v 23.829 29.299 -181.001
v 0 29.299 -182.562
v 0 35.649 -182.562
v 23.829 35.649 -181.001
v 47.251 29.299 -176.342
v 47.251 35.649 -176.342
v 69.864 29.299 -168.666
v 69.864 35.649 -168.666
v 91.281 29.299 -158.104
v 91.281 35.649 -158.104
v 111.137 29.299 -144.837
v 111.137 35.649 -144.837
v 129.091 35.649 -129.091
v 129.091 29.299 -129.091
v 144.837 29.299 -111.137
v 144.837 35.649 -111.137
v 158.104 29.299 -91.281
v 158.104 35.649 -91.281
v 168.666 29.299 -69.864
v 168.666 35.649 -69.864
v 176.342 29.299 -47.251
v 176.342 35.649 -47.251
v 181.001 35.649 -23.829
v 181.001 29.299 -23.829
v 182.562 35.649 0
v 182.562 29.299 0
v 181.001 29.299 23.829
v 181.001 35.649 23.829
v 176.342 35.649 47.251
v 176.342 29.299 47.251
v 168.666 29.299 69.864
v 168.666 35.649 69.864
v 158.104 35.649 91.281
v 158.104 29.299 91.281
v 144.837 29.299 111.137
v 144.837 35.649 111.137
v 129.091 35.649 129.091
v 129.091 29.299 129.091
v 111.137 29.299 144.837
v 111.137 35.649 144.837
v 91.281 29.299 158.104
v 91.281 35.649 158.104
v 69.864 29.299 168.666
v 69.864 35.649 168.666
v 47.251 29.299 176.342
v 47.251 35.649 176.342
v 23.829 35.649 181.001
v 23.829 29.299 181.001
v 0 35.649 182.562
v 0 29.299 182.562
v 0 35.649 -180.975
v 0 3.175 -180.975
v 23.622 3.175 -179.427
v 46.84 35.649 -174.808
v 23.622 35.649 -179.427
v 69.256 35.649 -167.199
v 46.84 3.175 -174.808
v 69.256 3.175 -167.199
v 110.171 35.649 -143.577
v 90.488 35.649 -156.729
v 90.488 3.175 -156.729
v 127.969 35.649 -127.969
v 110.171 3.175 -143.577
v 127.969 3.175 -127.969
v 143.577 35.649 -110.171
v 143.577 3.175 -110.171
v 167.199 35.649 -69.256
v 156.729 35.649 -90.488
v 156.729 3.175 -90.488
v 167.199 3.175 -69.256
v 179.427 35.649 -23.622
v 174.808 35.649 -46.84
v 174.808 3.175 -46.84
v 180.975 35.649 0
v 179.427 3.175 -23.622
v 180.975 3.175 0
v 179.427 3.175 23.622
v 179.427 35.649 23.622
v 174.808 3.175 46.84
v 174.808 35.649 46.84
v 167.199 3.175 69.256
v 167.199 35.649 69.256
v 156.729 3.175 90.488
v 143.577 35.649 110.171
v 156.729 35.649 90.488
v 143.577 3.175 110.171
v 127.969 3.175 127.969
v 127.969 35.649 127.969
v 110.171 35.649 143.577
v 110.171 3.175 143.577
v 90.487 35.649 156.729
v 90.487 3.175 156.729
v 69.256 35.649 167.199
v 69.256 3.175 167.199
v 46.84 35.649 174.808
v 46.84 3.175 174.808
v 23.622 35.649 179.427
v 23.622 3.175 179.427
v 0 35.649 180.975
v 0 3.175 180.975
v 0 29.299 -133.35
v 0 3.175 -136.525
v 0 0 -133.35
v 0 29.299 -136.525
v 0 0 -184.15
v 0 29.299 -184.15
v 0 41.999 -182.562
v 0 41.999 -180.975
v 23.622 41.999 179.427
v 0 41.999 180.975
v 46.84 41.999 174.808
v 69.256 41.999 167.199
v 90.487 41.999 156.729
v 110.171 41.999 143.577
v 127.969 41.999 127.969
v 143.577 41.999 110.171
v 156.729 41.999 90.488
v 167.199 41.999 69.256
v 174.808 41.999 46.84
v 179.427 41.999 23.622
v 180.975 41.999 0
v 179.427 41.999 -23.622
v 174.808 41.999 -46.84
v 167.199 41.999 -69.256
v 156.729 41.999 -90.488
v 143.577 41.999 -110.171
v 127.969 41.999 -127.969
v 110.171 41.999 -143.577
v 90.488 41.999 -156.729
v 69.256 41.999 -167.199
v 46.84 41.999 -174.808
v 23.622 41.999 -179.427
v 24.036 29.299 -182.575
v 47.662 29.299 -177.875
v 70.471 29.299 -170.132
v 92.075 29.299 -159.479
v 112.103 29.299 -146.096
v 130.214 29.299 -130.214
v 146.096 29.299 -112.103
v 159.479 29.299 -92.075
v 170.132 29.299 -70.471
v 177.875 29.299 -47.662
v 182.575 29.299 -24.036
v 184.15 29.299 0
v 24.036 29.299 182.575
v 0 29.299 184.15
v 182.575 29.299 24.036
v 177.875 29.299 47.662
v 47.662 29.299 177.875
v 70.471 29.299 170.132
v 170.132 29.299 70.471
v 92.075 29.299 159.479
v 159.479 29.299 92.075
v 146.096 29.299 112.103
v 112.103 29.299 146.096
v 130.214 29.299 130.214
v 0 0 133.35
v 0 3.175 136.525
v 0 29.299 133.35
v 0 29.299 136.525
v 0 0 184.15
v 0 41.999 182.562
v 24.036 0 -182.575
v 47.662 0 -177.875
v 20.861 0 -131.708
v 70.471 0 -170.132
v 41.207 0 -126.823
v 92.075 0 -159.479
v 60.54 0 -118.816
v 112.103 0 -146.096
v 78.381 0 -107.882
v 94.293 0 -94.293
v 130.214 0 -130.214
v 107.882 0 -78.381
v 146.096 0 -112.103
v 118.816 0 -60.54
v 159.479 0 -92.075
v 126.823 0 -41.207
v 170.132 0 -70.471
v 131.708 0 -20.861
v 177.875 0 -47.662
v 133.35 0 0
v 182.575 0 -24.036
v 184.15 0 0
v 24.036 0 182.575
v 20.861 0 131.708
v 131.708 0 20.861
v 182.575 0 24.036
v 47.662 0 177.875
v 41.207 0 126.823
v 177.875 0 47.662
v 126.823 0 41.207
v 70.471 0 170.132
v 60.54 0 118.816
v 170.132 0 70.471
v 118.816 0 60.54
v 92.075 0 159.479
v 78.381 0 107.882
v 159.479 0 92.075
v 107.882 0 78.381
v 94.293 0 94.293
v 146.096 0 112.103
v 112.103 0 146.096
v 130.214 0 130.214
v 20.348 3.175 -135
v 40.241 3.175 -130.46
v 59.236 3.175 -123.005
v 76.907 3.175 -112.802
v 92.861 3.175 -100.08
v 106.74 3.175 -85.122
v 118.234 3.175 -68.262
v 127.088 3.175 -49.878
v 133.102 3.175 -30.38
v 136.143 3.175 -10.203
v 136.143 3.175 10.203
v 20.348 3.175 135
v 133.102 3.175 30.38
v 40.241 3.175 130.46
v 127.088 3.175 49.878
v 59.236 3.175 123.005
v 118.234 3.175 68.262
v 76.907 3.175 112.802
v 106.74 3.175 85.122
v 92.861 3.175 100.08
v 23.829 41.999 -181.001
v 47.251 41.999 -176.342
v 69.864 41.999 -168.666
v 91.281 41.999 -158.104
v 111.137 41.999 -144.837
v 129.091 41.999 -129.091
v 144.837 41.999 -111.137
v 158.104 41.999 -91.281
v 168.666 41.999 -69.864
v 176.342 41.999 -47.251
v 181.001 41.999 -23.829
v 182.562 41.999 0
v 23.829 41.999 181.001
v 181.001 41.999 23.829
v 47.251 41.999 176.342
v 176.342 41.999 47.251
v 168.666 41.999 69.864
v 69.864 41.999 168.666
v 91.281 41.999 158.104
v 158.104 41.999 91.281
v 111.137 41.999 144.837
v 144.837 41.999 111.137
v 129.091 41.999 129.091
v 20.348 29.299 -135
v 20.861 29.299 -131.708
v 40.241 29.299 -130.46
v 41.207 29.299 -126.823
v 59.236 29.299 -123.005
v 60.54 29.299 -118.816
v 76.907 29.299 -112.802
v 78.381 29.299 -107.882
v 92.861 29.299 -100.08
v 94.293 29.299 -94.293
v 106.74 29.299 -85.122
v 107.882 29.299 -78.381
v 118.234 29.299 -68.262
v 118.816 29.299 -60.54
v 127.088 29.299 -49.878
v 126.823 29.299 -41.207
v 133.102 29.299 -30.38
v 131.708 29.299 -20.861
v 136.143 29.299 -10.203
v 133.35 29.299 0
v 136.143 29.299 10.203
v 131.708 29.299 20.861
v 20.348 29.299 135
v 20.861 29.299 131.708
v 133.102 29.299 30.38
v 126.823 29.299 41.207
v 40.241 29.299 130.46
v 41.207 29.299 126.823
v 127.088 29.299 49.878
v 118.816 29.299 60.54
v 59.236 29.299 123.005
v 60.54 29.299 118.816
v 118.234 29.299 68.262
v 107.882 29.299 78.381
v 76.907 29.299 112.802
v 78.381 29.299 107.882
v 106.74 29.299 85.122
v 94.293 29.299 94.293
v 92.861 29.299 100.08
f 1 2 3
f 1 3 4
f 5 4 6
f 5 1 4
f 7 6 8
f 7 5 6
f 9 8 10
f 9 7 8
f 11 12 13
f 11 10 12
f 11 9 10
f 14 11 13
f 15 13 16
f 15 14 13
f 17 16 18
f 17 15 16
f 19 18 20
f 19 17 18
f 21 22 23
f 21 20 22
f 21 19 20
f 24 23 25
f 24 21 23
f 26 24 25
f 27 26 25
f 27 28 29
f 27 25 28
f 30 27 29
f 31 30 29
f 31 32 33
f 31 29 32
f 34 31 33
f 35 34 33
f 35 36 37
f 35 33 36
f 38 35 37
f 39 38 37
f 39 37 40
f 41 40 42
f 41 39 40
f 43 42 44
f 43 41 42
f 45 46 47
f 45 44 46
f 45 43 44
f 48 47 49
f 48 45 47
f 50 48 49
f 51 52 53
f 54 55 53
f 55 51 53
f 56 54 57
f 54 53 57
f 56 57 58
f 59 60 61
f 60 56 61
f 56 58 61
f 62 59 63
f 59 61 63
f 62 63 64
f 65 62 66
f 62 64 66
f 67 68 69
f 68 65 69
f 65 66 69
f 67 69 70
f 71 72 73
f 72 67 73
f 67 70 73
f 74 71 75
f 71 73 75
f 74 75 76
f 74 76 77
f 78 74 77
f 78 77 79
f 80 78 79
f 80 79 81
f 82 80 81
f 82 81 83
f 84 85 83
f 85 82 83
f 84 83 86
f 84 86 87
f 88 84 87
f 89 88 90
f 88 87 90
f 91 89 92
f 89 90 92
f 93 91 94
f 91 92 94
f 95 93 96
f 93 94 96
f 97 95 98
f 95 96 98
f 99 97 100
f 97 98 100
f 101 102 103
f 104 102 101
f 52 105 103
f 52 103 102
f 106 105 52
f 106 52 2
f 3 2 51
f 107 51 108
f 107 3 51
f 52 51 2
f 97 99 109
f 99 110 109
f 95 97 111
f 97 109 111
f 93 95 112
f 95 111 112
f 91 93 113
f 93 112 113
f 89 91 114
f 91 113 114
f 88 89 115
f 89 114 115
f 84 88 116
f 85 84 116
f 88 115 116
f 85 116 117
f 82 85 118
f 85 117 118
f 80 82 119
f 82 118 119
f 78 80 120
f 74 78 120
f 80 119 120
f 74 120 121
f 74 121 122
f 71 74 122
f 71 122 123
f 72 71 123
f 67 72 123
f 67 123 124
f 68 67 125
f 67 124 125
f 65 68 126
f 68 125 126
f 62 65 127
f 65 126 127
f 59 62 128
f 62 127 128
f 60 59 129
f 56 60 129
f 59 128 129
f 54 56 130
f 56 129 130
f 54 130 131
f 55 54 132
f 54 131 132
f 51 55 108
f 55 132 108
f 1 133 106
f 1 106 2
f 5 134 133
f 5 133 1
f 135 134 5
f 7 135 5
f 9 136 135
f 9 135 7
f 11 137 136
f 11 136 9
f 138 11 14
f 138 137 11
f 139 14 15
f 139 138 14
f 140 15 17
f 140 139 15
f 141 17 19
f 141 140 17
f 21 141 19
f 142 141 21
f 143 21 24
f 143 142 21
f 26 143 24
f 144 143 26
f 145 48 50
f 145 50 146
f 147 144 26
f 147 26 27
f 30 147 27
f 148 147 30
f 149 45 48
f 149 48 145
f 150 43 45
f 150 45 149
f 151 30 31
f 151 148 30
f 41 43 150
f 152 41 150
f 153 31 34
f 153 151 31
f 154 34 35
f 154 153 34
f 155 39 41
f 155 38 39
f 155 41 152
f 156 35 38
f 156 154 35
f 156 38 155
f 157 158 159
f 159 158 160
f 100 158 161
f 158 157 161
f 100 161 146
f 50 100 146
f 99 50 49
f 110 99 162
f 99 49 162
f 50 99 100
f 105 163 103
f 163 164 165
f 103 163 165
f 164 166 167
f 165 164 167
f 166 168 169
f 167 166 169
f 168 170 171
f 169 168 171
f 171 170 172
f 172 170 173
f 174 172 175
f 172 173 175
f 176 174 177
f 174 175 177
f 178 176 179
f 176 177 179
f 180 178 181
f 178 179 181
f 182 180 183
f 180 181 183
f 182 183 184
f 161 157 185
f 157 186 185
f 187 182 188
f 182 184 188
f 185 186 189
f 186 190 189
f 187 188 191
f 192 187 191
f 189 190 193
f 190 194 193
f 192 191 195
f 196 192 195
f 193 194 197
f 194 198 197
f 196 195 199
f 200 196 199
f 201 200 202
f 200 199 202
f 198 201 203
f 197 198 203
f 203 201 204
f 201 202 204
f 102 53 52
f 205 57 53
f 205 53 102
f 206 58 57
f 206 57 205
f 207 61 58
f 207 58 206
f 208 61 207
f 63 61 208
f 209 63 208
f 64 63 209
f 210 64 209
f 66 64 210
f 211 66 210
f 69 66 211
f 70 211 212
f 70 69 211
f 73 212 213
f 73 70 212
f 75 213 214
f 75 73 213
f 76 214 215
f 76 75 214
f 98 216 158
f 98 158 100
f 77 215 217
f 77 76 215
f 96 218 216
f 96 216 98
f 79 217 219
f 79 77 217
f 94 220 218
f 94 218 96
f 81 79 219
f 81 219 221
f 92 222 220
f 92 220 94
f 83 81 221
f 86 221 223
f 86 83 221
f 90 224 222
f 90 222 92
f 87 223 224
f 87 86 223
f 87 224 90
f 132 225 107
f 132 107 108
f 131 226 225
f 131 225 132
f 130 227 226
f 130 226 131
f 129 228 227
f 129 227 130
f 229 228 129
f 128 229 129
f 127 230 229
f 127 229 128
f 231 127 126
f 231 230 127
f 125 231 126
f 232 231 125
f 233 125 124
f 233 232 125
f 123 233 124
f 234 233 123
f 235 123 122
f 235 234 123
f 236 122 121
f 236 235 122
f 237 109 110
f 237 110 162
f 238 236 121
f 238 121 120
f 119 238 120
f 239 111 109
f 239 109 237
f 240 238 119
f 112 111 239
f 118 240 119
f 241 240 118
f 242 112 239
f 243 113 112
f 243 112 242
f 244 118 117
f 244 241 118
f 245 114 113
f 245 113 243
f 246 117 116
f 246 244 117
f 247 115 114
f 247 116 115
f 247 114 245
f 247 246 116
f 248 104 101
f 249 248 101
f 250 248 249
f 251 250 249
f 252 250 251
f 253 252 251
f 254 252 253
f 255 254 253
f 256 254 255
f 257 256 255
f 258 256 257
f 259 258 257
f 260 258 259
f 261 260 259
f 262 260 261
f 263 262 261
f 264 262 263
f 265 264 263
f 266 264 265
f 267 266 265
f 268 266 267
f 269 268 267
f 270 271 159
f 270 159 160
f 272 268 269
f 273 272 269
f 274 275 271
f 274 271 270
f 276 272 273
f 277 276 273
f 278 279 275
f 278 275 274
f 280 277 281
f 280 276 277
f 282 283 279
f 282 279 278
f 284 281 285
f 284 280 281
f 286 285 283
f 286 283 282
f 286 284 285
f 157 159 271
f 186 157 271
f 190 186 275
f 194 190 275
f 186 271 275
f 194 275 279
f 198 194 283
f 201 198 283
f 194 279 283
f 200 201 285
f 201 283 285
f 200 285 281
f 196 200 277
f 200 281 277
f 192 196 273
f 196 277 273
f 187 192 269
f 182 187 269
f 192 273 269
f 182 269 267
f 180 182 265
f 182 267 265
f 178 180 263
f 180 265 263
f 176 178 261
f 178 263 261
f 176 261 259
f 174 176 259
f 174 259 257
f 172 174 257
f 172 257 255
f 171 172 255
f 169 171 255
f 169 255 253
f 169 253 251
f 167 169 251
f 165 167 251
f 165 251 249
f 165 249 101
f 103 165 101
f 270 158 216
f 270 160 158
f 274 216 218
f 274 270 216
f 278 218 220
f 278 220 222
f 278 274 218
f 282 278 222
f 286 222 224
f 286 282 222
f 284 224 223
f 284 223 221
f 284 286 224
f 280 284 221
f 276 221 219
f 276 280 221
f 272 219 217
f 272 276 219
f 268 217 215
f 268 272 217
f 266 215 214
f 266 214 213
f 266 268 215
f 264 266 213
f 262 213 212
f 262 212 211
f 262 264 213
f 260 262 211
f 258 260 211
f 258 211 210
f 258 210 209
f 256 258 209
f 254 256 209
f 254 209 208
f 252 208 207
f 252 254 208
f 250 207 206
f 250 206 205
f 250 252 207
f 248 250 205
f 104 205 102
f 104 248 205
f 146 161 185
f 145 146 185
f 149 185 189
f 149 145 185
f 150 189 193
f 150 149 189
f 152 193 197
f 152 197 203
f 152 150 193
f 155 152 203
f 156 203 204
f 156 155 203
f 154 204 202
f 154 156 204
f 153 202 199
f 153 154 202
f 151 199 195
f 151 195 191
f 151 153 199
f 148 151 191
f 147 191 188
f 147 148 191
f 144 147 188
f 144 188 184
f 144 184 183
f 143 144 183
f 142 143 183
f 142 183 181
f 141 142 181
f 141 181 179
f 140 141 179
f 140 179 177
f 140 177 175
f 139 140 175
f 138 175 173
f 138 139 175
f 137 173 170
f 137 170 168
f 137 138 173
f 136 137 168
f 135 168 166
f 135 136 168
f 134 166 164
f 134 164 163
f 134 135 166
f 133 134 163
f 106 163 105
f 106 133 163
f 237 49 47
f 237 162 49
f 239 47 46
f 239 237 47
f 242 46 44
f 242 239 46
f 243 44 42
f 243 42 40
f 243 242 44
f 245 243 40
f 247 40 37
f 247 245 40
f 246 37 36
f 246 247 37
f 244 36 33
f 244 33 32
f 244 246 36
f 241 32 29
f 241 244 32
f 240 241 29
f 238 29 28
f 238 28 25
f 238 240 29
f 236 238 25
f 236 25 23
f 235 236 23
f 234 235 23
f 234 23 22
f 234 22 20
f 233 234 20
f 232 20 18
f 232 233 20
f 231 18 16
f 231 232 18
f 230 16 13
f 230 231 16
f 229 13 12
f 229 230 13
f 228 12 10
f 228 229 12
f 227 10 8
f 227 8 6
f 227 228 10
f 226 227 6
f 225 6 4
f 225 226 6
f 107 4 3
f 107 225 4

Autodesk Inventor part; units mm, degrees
ref_plane "YZ Plane" through (0, 0, 0) normal (1, 0, 0) x (0, 1, 0)
ref_plane "XZ Plane" through (0, 0, 0) normal (0, 1, 0) x (-1, 0, 0)
ref_plane "XY Plane" through (0, 0, 0) normal (0, 0, 1) x (1, 0, 0)
sketch "Sketch1" plane through (0, 0, 0) normal (1, 0, 0) x (0, 1, 0)
  line L0 (0, 0) -> (50.8, 0)
  line L1 (0, 133.35) -> (0, 184.15)
  line L2 (0, 184.15) -> (29.2989, 184.15)
  line L3 (73.025, 184.15) -> (73.025, 133.35)
  line L4 (3.175, 180.975) -> (3.175, 136.525)
  line L5 (69.85, 136.525) -> (69.85, 180.975)
  line L6 (29.2989, 148.3694) -> (29.2989, 120.4477)
  line L7 (41.9989, 148.9666) -> (41.9989, 122.6874)
  line L8 (0, 133.35) -> (29.2989, 133.35)
  line L9 (41.9989, 133.35) -> (73.025, 133.35)
  line L10 (3.175, 136.525) -> (29.2989, 136.525)
  line L11 (41.9989, 136.525) -> (69.85, 136.525)
  line L12 (35.6489, 182.5625) -> (41.9989, 182.5625)
  line L13 (41.9989, 182.5625) -> (41.9989, 180.975)
  line L14 (35.6489, 182.5625) -> (29.2989, 182.5625)
  line L15 (29.2989, 182.5625) -> (29.2989, 184.15)
  line L16 (69.85, 180.975) -> (41.9989, 180.975)
  line L17 (35.6489, 180.975) -> (3.175, 180.975)
  line L18 (35.6489, 170.617) -> (35.6489, 180.975)
  line L19 (35.6489, 184.15) -> (35.6489, 201.7381)
  line L20 (35.6489, 180.975) -> (41.9989, 180.975)
  point P0 (3.175, 180.975)
  point P1 (69.85, 136.525)
  dimension "d0" = 50.8
  dimension "d3" = 50.8
  dimension "d4" = 73.025
  dimension "d5" = 3.175
  dimension "d6" = 3.175
  dimension "d7" = 3.175
  dimension "d8" = 3.175
  dimension "d9" = 3.175
  dimension "d11" = 3.175
  dimension "d13" = 26.1239
  dimension "d14" = 12.7
  dimension "d16" = 133.35
  dimension "d17" = 3.175
  dimension "d18" = 3.175
  dimension "d19" = 6.35
  dimension "d21" = 6.35
  dimension "d22" = 6.35
revolve "Revolution1" add sketch "Sketch1" angle 180 about axis through (0, 0, 0) along (0, 1, 0)
properties part number "Outer_Shell_Bottom"
